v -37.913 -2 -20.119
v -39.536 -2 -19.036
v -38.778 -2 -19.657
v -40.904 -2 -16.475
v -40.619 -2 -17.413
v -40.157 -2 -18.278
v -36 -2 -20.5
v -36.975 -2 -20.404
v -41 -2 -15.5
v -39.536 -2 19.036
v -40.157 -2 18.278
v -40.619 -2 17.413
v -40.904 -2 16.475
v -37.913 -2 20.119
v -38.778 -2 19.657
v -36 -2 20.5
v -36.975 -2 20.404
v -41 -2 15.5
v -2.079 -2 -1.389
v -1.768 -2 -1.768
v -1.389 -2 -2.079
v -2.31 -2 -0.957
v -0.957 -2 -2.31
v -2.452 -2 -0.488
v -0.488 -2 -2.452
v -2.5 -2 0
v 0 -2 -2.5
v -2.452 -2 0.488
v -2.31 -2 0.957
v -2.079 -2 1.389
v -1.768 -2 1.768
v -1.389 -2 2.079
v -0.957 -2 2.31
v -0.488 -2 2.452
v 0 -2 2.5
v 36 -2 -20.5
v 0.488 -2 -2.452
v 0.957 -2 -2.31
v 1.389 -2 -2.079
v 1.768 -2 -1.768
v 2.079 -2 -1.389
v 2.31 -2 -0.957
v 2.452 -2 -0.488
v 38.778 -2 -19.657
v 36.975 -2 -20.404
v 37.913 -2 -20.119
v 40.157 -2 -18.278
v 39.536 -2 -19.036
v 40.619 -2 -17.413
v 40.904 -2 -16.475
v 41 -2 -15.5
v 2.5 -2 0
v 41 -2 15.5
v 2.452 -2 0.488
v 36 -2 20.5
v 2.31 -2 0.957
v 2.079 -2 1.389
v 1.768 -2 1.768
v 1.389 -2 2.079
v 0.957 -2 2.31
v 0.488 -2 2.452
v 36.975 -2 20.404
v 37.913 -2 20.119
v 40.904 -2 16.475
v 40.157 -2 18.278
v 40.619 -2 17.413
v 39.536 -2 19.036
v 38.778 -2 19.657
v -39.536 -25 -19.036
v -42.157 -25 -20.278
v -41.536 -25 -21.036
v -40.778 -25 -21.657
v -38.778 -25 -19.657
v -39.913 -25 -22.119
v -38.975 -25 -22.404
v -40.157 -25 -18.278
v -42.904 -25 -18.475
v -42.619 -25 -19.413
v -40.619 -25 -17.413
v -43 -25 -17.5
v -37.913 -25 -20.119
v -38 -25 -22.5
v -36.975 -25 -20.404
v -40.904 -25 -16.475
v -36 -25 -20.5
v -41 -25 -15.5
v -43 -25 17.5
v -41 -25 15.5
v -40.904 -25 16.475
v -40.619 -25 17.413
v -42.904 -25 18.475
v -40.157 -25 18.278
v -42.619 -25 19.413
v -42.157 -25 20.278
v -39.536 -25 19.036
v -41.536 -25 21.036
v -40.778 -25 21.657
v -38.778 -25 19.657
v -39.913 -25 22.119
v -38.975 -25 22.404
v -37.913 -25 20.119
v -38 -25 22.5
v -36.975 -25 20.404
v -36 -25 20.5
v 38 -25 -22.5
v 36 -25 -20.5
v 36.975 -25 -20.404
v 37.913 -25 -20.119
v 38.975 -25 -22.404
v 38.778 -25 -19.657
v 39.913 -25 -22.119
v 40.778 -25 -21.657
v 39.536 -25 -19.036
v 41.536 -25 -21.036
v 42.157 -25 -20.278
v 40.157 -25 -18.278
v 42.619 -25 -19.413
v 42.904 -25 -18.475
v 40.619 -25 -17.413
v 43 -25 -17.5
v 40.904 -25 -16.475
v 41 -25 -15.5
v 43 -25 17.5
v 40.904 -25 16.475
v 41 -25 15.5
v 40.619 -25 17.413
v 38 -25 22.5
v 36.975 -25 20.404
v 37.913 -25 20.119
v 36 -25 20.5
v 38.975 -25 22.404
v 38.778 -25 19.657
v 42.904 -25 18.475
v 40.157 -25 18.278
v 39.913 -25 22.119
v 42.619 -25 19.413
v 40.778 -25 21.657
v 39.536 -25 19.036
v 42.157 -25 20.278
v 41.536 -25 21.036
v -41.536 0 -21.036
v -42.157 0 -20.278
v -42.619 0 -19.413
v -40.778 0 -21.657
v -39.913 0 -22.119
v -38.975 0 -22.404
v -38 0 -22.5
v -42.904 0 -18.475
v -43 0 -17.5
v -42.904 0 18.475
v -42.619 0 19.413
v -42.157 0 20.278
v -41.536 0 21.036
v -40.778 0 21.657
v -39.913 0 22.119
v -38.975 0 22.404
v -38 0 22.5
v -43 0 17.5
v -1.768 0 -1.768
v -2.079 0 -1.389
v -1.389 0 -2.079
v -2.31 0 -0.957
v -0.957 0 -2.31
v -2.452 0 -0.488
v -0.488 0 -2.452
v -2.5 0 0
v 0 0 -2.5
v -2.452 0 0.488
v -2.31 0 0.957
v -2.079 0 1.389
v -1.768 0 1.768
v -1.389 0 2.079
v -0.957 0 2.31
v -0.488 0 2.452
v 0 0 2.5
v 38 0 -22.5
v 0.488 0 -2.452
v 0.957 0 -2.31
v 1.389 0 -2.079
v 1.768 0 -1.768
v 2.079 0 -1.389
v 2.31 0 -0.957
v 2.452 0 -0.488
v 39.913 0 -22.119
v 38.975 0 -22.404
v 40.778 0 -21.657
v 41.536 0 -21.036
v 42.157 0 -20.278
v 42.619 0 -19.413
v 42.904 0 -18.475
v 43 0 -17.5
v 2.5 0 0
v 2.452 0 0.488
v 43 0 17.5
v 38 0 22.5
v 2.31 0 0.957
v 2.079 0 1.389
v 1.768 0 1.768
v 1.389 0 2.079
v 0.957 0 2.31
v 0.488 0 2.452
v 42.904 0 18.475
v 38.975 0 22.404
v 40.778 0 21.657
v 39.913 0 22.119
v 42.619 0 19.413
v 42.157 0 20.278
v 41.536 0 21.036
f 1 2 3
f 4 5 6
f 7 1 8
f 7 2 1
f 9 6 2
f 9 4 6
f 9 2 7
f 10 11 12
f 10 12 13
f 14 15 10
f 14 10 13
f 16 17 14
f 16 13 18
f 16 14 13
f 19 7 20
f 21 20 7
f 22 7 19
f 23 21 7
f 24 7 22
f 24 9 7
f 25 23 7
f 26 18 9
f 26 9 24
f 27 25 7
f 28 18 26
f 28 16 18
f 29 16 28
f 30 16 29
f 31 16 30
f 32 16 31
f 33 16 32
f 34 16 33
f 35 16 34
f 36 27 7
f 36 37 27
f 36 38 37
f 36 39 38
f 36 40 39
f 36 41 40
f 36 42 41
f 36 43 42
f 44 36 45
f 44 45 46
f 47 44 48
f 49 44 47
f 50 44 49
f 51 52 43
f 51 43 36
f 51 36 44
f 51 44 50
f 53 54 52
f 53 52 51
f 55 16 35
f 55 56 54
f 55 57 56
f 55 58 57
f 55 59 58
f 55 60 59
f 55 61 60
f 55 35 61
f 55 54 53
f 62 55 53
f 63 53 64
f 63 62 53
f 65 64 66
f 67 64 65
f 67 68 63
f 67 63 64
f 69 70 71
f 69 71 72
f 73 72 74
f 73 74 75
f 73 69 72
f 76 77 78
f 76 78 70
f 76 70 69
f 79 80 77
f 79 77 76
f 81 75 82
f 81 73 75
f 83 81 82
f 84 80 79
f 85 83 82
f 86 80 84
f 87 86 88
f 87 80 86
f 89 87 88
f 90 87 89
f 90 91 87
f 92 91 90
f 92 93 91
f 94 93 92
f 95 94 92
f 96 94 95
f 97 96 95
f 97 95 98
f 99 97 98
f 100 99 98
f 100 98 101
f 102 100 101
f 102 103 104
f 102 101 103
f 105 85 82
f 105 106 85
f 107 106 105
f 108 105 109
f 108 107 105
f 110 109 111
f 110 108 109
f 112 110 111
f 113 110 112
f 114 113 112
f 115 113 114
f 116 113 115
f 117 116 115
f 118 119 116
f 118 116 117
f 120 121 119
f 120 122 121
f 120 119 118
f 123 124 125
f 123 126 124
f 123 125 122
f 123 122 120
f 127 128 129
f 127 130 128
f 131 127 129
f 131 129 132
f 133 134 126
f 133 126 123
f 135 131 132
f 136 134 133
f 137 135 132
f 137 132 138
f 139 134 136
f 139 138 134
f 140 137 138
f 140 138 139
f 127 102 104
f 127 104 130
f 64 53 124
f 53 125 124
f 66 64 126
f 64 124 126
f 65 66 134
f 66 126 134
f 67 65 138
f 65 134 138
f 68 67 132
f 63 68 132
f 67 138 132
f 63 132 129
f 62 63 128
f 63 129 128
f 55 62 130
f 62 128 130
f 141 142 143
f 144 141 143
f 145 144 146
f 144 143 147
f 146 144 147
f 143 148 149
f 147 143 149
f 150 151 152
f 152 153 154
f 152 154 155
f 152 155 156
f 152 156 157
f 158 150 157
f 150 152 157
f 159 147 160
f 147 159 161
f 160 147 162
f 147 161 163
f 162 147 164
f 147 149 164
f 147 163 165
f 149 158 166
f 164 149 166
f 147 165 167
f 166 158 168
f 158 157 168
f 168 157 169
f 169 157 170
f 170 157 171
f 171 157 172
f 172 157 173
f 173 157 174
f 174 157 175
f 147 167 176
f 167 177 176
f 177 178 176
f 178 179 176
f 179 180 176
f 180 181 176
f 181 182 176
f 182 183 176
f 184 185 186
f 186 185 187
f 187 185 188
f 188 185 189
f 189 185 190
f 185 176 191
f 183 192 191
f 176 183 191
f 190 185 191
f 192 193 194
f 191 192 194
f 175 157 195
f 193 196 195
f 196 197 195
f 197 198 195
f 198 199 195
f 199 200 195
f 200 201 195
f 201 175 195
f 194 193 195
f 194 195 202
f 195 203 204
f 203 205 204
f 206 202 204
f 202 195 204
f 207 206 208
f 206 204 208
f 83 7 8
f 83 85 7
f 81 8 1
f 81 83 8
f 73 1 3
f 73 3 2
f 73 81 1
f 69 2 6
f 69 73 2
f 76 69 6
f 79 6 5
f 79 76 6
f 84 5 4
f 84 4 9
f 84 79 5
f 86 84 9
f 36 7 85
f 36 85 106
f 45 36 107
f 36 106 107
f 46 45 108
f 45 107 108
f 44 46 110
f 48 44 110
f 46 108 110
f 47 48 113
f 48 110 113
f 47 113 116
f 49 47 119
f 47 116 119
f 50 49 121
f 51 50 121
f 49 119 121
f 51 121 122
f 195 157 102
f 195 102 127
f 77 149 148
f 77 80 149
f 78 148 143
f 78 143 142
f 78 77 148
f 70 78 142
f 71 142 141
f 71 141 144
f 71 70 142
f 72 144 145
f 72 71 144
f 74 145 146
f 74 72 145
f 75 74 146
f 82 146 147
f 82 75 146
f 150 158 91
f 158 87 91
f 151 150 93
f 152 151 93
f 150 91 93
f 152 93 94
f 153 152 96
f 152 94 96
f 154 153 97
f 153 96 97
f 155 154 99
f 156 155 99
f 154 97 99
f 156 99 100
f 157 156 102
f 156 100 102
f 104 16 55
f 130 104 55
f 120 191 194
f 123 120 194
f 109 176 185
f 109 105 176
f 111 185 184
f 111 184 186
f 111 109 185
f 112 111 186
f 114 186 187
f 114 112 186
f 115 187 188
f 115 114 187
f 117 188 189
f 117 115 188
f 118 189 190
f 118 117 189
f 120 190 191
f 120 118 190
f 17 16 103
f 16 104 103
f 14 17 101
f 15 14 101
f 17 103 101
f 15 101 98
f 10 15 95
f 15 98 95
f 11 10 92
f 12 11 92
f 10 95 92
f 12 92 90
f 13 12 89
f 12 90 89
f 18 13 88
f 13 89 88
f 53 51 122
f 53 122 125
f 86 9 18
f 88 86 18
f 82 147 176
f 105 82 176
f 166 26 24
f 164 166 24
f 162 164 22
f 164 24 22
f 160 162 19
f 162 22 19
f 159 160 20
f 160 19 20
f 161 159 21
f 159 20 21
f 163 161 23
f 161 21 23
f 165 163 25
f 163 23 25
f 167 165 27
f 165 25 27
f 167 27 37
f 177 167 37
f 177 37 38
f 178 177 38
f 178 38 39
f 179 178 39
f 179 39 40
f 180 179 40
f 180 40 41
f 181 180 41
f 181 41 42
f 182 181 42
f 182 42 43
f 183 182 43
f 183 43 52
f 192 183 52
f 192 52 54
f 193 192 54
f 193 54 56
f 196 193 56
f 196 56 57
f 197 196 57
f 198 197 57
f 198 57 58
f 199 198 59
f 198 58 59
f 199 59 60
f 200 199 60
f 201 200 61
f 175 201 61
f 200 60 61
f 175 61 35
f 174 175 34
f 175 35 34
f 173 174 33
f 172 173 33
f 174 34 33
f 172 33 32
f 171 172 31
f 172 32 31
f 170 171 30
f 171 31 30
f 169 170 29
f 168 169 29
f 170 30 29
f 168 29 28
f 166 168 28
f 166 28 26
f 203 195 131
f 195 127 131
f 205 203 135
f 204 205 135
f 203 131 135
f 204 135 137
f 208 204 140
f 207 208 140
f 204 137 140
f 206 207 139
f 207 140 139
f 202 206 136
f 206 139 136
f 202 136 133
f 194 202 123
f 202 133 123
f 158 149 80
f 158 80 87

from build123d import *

# Parameters (mm, degrees)
F0_W     = 82
F0_H     = 41
F1_DEPTH = 2
F0_W_2   = 86
F0_H_2   = 45
F2_DEPTH = 25
F3_R     = 5
F4_D     = 5


with BuildPart() as f1:
    # F0 (on Front) → F1 (new body)
    with BuildSketch(Plane.XZ):
        Rectangle(F0_W, F0_H)
    extrude(amount=F1_DEPTH)

    # F0 (on Front) → F2 (join)
    with BuildSketch(Plane.XZ):
        Rectangle(F0_W_2, F0_H_2)
        Rectangle(F0_W, F0_H, mode=Mode.SUBTRACT)
    extrude(amount=F2_DEPTH)

    # F3
    f3_edges = [f1.edges().sort_by_distance(p)[0] for p in [
        (43, -12.5, 22.5),
        (-43, -12.5, -22.5),
        (-43, -12.5, 22.5),
        (43, -12.5, -22.5),
        (41, -13.5, -20.5),
        (-41, -13.5, -20.5),
        (41, -13.5, 20.5),
        (-41, -13.5, 20.5),
    ]]
    fillet(f3_edges, radius=F3_R)

    # F4 (through all)
    with Locations(Plane(origin=(0, 0, 0), x_dir=(1, 0, 0), z_dir=(0, 1, 0))):
        with Locations((0, 0)):
            Hole(F4_D / 2)


solid = f1.part
